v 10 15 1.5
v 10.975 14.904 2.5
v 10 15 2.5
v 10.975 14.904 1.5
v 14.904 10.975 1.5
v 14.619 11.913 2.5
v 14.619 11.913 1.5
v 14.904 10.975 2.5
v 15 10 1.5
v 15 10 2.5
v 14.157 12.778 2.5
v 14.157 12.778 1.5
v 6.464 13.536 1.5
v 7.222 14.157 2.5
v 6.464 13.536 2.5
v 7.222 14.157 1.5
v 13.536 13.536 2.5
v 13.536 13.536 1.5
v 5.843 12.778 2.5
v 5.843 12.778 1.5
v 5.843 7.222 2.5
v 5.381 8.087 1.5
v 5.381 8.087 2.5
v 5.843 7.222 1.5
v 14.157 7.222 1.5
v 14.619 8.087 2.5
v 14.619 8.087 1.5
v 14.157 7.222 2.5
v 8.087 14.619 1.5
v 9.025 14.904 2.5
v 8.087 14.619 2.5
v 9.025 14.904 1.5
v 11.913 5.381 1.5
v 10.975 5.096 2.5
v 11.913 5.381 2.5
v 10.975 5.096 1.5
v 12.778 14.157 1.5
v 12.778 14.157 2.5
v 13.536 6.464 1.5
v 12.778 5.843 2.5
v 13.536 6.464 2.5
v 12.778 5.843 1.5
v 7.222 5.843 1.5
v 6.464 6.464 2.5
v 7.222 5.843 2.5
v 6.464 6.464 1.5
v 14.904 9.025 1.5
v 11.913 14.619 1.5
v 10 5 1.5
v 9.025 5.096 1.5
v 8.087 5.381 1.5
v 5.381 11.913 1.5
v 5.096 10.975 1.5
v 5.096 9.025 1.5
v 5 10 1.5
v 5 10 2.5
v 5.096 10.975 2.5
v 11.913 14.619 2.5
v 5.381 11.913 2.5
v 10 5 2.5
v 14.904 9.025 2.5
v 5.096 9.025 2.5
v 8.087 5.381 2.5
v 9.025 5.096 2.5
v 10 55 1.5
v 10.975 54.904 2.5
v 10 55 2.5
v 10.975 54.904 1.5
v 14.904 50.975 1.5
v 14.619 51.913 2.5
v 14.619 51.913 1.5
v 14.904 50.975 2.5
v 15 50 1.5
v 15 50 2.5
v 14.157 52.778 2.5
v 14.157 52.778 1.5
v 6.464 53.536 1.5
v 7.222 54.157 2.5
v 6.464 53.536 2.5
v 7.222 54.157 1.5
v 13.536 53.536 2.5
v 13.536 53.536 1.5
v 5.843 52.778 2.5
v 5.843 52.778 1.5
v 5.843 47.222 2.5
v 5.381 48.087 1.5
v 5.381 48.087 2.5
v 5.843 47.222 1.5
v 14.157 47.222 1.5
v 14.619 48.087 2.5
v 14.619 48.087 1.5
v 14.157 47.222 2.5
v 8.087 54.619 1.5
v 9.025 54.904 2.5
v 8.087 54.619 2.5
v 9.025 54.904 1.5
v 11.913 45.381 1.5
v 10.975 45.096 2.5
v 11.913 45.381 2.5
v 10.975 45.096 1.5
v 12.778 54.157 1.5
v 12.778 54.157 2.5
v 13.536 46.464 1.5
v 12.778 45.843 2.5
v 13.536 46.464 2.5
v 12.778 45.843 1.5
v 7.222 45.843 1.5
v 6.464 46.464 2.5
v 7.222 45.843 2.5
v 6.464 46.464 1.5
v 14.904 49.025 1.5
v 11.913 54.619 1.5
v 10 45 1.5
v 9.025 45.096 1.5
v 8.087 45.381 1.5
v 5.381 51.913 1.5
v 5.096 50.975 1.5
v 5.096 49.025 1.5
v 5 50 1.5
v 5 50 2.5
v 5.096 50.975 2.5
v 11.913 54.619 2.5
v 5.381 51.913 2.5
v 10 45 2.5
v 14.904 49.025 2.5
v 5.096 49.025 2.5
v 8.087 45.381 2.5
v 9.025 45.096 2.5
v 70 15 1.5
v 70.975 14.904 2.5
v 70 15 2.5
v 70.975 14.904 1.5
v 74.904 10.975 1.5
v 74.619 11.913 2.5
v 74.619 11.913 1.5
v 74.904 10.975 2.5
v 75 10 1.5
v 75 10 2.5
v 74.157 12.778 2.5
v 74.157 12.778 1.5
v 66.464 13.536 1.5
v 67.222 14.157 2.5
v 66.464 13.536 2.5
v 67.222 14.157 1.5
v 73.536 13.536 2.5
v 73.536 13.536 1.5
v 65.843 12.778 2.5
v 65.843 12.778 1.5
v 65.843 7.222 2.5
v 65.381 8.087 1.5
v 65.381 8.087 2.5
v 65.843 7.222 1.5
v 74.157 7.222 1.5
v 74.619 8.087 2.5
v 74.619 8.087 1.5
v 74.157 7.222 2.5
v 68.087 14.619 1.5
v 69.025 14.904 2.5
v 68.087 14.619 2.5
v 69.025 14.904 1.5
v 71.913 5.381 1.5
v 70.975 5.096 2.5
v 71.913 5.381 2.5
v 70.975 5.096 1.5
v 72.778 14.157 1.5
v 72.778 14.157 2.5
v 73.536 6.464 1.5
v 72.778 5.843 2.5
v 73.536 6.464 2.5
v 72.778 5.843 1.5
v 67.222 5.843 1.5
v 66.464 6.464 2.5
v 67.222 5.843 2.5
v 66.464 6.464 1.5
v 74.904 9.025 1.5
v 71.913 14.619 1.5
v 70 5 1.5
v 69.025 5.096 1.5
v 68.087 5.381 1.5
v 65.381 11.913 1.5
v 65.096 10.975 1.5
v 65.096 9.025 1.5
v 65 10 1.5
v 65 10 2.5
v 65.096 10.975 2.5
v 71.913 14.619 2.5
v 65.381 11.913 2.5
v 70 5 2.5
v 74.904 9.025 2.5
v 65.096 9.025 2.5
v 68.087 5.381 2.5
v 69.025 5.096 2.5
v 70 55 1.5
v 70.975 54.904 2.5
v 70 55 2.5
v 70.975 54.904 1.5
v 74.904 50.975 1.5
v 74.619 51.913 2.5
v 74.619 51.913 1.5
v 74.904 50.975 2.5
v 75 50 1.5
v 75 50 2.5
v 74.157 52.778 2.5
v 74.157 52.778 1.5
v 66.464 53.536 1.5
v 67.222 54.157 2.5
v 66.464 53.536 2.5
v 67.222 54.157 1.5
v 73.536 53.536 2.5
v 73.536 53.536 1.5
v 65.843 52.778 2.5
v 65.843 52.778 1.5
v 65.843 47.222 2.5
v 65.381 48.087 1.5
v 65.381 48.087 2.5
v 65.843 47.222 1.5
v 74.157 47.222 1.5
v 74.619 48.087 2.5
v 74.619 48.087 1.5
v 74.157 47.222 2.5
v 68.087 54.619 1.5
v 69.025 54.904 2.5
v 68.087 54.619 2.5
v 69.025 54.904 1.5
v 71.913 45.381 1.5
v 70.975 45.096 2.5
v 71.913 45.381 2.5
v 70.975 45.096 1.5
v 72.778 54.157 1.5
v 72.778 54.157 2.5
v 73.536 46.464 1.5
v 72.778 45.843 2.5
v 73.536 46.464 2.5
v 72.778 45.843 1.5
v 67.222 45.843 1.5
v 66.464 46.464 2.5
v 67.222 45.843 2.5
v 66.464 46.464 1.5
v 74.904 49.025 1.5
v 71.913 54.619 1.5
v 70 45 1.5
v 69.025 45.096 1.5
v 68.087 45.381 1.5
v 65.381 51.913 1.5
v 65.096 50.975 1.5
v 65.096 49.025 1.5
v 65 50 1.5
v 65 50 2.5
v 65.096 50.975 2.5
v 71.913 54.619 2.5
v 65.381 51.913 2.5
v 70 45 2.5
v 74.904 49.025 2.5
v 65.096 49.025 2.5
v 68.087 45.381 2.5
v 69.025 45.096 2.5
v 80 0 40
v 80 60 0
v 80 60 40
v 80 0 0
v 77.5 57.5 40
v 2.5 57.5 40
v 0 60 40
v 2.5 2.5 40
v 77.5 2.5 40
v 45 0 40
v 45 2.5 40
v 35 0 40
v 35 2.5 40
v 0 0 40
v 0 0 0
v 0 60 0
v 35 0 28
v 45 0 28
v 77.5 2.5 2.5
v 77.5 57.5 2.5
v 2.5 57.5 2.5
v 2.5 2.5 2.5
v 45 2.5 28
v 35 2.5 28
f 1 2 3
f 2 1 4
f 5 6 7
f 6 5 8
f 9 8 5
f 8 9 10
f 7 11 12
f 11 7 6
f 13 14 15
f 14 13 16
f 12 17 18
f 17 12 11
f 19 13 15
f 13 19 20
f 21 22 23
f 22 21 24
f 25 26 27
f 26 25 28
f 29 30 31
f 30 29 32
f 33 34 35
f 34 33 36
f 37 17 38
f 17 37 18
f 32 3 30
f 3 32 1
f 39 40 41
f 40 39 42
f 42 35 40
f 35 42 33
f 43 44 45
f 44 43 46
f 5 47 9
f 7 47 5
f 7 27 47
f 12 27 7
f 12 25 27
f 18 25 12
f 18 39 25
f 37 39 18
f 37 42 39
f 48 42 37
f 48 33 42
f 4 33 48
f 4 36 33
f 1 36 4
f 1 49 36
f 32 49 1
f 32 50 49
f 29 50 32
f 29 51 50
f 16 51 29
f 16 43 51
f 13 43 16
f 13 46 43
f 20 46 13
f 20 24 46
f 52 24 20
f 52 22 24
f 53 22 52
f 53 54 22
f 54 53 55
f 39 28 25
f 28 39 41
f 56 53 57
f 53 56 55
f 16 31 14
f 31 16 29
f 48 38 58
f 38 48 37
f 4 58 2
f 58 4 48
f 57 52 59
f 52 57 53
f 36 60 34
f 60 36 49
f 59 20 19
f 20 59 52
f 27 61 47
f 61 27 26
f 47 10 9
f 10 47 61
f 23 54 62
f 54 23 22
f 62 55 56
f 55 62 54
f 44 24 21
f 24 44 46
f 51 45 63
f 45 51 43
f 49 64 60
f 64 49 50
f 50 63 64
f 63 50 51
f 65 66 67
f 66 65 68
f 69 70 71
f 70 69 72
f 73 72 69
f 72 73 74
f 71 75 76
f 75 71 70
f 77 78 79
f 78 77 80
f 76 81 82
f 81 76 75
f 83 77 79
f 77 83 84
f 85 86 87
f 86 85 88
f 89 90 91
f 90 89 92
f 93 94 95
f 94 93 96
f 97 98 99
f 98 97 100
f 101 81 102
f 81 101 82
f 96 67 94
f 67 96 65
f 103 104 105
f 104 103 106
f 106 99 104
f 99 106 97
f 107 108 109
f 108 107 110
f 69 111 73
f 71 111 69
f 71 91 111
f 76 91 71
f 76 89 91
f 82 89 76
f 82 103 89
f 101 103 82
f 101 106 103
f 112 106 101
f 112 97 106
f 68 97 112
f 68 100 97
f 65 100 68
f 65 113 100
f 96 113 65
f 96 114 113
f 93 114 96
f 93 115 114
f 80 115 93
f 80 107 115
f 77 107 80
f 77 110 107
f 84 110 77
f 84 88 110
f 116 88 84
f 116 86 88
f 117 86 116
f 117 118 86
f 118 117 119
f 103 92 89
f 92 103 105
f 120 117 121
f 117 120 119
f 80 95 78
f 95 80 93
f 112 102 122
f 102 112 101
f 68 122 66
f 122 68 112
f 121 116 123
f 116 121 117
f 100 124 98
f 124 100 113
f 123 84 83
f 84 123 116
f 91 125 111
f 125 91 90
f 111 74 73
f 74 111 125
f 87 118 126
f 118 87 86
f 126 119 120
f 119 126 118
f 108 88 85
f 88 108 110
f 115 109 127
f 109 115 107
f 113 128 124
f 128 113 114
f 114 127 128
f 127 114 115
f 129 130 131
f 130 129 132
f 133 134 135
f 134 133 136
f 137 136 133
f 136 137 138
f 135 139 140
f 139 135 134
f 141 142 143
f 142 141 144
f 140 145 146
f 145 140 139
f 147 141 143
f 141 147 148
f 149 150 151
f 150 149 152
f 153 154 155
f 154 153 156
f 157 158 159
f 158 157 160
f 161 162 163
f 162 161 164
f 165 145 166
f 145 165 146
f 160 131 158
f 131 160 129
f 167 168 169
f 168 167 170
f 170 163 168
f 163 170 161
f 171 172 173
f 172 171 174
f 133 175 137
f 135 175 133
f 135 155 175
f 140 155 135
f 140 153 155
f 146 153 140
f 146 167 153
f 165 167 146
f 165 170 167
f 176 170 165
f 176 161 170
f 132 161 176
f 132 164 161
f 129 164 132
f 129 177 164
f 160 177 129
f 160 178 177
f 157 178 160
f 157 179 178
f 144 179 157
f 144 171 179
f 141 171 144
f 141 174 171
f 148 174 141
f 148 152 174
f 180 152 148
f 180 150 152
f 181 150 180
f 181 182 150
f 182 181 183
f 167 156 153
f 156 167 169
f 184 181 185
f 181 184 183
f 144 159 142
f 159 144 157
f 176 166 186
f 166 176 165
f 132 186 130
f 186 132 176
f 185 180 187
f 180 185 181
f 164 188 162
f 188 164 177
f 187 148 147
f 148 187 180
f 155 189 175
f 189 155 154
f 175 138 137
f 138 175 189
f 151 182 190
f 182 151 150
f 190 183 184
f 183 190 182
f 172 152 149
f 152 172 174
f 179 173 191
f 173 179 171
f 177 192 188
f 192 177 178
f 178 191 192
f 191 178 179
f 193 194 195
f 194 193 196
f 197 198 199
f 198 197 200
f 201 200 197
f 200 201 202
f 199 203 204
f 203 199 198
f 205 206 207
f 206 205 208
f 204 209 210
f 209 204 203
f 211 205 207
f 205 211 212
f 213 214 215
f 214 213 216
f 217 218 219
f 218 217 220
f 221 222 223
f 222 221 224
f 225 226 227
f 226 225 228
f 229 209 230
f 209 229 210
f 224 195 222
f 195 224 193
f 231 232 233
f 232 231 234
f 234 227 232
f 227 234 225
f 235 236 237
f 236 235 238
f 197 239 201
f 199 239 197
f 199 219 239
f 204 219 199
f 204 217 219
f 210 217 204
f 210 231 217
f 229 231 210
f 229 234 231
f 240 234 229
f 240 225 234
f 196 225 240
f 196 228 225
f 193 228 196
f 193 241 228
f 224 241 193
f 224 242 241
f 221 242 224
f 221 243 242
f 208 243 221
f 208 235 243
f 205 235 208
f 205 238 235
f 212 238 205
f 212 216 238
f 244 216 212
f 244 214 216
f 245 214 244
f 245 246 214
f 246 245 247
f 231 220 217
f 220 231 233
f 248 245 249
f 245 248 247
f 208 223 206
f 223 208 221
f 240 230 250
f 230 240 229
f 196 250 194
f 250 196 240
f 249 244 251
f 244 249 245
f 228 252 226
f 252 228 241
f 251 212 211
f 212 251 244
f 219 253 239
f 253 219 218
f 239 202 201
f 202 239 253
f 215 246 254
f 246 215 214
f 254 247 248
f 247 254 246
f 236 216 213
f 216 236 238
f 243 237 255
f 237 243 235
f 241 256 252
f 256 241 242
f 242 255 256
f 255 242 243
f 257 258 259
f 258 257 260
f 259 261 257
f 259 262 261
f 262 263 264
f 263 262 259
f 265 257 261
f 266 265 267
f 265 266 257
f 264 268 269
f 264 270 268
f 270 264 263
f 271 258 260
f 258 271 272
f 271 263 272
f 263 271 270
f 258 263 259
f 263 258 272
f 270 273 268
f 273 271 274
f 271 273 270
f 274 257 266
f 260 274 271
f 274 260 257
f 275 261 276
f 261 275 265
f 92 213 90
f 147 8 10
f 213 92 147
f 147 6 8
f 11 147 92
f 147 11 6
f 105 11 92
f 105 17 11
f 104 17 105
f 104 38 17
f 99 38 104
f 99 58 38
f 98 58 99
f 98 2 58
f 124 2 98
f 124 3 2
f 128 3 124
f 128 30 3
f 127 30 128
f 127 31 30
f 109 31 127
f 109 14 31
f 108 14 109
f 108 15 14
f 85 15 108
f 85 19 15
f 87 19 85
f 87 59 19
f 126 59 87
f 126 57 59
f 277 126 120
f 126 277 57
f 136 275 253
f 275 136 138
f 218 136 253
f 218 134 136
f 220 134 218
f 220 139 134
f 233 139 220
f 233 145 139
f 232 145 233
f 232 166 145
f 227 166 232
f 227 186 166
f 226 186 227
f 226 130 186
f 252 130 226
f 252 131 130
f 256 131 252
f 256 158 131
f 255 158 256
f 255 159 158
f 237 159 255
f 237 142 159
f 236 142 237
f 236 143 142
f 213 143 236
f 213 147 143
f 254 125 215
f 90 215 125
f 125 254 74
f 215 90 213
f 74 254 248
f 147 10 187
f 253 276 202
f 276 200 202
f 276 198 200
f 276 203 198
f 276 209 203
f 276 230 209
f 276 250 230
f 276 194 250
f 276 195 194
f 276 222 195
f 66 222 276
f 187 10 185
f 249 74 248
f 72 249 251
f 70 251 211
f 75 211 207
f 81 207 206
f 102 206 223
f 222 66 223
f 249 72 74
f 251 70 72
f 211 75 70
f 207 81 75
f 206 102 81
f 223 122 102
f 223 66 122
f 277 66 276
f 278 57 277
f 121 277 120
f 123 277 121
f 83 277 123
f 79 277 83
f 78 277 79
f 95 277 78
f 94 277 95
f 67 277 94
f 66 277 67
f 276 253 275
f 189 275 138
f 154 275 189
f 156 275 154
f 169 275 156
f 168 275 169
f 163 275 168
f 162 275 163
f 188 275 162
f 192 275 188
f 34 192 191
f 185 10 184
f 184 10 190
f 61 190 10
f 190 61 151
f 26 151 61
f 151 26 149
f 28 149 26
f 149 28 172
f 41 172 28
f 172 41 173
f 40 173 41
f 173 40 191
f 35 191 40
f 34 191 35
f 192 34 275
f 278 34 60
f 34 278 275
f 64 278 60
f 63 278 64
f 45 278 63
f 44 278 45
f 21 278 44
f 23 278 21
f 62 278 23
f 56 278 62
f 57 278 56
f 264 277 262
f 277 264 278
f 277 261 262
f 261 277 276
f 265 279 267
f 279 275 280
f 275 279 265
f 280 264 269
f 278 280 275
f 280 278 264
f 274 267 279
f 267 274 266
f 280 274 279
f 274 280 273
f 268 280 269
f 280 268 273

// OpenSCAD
$fn = 32;

// ----------------------------------------------------------------------
// Enclosure box: both enclosure
// ----------------------------------------------------------------------

// --- parameters (mm) ---
box_l = 80;               // outer length, X
box_w = 60;               // outer width, Y
box_h = 40;               // outer height
wall_t = 2.5;             // wall thickness
boss_r = 5;               // corner boss radius
hole_r = 1.5;             // boss screw hole radius
boss_in = 10;             // boss inset from the corners
notch_w = 10;             // cable notch width
notch_h = 12;             // cable notch height

inner_h = box_h - wall_t;  // cavity depth
boss_h = inner_h - 2;  // corner boss height

difference() {
  cube([box_l, box_w, box_h]);
  translate([wall_t, wall_t, wall_t])
    cube([box_l - 2 * wall_t, box_w - 2 * wall_t, box_h]);
  for (sx = [0, 1], sy = [0, 1])
    translate([sx ? box_l - boss_in : boss_in,
               sy ? box_w - boss_in : boss_in, wall_t - 1]) {
      cylinder(r = boss_r, h = boss_h);
      translate([0, 0, boss_h - 4])
        cylinder(r = hole_r, h = 5);
    }
  translate([box_l / 2 - notch_w / 2, -1, box_h - notch_h])
    cube([notch_w, wall_t + 2, notch_h + 1]);
}
